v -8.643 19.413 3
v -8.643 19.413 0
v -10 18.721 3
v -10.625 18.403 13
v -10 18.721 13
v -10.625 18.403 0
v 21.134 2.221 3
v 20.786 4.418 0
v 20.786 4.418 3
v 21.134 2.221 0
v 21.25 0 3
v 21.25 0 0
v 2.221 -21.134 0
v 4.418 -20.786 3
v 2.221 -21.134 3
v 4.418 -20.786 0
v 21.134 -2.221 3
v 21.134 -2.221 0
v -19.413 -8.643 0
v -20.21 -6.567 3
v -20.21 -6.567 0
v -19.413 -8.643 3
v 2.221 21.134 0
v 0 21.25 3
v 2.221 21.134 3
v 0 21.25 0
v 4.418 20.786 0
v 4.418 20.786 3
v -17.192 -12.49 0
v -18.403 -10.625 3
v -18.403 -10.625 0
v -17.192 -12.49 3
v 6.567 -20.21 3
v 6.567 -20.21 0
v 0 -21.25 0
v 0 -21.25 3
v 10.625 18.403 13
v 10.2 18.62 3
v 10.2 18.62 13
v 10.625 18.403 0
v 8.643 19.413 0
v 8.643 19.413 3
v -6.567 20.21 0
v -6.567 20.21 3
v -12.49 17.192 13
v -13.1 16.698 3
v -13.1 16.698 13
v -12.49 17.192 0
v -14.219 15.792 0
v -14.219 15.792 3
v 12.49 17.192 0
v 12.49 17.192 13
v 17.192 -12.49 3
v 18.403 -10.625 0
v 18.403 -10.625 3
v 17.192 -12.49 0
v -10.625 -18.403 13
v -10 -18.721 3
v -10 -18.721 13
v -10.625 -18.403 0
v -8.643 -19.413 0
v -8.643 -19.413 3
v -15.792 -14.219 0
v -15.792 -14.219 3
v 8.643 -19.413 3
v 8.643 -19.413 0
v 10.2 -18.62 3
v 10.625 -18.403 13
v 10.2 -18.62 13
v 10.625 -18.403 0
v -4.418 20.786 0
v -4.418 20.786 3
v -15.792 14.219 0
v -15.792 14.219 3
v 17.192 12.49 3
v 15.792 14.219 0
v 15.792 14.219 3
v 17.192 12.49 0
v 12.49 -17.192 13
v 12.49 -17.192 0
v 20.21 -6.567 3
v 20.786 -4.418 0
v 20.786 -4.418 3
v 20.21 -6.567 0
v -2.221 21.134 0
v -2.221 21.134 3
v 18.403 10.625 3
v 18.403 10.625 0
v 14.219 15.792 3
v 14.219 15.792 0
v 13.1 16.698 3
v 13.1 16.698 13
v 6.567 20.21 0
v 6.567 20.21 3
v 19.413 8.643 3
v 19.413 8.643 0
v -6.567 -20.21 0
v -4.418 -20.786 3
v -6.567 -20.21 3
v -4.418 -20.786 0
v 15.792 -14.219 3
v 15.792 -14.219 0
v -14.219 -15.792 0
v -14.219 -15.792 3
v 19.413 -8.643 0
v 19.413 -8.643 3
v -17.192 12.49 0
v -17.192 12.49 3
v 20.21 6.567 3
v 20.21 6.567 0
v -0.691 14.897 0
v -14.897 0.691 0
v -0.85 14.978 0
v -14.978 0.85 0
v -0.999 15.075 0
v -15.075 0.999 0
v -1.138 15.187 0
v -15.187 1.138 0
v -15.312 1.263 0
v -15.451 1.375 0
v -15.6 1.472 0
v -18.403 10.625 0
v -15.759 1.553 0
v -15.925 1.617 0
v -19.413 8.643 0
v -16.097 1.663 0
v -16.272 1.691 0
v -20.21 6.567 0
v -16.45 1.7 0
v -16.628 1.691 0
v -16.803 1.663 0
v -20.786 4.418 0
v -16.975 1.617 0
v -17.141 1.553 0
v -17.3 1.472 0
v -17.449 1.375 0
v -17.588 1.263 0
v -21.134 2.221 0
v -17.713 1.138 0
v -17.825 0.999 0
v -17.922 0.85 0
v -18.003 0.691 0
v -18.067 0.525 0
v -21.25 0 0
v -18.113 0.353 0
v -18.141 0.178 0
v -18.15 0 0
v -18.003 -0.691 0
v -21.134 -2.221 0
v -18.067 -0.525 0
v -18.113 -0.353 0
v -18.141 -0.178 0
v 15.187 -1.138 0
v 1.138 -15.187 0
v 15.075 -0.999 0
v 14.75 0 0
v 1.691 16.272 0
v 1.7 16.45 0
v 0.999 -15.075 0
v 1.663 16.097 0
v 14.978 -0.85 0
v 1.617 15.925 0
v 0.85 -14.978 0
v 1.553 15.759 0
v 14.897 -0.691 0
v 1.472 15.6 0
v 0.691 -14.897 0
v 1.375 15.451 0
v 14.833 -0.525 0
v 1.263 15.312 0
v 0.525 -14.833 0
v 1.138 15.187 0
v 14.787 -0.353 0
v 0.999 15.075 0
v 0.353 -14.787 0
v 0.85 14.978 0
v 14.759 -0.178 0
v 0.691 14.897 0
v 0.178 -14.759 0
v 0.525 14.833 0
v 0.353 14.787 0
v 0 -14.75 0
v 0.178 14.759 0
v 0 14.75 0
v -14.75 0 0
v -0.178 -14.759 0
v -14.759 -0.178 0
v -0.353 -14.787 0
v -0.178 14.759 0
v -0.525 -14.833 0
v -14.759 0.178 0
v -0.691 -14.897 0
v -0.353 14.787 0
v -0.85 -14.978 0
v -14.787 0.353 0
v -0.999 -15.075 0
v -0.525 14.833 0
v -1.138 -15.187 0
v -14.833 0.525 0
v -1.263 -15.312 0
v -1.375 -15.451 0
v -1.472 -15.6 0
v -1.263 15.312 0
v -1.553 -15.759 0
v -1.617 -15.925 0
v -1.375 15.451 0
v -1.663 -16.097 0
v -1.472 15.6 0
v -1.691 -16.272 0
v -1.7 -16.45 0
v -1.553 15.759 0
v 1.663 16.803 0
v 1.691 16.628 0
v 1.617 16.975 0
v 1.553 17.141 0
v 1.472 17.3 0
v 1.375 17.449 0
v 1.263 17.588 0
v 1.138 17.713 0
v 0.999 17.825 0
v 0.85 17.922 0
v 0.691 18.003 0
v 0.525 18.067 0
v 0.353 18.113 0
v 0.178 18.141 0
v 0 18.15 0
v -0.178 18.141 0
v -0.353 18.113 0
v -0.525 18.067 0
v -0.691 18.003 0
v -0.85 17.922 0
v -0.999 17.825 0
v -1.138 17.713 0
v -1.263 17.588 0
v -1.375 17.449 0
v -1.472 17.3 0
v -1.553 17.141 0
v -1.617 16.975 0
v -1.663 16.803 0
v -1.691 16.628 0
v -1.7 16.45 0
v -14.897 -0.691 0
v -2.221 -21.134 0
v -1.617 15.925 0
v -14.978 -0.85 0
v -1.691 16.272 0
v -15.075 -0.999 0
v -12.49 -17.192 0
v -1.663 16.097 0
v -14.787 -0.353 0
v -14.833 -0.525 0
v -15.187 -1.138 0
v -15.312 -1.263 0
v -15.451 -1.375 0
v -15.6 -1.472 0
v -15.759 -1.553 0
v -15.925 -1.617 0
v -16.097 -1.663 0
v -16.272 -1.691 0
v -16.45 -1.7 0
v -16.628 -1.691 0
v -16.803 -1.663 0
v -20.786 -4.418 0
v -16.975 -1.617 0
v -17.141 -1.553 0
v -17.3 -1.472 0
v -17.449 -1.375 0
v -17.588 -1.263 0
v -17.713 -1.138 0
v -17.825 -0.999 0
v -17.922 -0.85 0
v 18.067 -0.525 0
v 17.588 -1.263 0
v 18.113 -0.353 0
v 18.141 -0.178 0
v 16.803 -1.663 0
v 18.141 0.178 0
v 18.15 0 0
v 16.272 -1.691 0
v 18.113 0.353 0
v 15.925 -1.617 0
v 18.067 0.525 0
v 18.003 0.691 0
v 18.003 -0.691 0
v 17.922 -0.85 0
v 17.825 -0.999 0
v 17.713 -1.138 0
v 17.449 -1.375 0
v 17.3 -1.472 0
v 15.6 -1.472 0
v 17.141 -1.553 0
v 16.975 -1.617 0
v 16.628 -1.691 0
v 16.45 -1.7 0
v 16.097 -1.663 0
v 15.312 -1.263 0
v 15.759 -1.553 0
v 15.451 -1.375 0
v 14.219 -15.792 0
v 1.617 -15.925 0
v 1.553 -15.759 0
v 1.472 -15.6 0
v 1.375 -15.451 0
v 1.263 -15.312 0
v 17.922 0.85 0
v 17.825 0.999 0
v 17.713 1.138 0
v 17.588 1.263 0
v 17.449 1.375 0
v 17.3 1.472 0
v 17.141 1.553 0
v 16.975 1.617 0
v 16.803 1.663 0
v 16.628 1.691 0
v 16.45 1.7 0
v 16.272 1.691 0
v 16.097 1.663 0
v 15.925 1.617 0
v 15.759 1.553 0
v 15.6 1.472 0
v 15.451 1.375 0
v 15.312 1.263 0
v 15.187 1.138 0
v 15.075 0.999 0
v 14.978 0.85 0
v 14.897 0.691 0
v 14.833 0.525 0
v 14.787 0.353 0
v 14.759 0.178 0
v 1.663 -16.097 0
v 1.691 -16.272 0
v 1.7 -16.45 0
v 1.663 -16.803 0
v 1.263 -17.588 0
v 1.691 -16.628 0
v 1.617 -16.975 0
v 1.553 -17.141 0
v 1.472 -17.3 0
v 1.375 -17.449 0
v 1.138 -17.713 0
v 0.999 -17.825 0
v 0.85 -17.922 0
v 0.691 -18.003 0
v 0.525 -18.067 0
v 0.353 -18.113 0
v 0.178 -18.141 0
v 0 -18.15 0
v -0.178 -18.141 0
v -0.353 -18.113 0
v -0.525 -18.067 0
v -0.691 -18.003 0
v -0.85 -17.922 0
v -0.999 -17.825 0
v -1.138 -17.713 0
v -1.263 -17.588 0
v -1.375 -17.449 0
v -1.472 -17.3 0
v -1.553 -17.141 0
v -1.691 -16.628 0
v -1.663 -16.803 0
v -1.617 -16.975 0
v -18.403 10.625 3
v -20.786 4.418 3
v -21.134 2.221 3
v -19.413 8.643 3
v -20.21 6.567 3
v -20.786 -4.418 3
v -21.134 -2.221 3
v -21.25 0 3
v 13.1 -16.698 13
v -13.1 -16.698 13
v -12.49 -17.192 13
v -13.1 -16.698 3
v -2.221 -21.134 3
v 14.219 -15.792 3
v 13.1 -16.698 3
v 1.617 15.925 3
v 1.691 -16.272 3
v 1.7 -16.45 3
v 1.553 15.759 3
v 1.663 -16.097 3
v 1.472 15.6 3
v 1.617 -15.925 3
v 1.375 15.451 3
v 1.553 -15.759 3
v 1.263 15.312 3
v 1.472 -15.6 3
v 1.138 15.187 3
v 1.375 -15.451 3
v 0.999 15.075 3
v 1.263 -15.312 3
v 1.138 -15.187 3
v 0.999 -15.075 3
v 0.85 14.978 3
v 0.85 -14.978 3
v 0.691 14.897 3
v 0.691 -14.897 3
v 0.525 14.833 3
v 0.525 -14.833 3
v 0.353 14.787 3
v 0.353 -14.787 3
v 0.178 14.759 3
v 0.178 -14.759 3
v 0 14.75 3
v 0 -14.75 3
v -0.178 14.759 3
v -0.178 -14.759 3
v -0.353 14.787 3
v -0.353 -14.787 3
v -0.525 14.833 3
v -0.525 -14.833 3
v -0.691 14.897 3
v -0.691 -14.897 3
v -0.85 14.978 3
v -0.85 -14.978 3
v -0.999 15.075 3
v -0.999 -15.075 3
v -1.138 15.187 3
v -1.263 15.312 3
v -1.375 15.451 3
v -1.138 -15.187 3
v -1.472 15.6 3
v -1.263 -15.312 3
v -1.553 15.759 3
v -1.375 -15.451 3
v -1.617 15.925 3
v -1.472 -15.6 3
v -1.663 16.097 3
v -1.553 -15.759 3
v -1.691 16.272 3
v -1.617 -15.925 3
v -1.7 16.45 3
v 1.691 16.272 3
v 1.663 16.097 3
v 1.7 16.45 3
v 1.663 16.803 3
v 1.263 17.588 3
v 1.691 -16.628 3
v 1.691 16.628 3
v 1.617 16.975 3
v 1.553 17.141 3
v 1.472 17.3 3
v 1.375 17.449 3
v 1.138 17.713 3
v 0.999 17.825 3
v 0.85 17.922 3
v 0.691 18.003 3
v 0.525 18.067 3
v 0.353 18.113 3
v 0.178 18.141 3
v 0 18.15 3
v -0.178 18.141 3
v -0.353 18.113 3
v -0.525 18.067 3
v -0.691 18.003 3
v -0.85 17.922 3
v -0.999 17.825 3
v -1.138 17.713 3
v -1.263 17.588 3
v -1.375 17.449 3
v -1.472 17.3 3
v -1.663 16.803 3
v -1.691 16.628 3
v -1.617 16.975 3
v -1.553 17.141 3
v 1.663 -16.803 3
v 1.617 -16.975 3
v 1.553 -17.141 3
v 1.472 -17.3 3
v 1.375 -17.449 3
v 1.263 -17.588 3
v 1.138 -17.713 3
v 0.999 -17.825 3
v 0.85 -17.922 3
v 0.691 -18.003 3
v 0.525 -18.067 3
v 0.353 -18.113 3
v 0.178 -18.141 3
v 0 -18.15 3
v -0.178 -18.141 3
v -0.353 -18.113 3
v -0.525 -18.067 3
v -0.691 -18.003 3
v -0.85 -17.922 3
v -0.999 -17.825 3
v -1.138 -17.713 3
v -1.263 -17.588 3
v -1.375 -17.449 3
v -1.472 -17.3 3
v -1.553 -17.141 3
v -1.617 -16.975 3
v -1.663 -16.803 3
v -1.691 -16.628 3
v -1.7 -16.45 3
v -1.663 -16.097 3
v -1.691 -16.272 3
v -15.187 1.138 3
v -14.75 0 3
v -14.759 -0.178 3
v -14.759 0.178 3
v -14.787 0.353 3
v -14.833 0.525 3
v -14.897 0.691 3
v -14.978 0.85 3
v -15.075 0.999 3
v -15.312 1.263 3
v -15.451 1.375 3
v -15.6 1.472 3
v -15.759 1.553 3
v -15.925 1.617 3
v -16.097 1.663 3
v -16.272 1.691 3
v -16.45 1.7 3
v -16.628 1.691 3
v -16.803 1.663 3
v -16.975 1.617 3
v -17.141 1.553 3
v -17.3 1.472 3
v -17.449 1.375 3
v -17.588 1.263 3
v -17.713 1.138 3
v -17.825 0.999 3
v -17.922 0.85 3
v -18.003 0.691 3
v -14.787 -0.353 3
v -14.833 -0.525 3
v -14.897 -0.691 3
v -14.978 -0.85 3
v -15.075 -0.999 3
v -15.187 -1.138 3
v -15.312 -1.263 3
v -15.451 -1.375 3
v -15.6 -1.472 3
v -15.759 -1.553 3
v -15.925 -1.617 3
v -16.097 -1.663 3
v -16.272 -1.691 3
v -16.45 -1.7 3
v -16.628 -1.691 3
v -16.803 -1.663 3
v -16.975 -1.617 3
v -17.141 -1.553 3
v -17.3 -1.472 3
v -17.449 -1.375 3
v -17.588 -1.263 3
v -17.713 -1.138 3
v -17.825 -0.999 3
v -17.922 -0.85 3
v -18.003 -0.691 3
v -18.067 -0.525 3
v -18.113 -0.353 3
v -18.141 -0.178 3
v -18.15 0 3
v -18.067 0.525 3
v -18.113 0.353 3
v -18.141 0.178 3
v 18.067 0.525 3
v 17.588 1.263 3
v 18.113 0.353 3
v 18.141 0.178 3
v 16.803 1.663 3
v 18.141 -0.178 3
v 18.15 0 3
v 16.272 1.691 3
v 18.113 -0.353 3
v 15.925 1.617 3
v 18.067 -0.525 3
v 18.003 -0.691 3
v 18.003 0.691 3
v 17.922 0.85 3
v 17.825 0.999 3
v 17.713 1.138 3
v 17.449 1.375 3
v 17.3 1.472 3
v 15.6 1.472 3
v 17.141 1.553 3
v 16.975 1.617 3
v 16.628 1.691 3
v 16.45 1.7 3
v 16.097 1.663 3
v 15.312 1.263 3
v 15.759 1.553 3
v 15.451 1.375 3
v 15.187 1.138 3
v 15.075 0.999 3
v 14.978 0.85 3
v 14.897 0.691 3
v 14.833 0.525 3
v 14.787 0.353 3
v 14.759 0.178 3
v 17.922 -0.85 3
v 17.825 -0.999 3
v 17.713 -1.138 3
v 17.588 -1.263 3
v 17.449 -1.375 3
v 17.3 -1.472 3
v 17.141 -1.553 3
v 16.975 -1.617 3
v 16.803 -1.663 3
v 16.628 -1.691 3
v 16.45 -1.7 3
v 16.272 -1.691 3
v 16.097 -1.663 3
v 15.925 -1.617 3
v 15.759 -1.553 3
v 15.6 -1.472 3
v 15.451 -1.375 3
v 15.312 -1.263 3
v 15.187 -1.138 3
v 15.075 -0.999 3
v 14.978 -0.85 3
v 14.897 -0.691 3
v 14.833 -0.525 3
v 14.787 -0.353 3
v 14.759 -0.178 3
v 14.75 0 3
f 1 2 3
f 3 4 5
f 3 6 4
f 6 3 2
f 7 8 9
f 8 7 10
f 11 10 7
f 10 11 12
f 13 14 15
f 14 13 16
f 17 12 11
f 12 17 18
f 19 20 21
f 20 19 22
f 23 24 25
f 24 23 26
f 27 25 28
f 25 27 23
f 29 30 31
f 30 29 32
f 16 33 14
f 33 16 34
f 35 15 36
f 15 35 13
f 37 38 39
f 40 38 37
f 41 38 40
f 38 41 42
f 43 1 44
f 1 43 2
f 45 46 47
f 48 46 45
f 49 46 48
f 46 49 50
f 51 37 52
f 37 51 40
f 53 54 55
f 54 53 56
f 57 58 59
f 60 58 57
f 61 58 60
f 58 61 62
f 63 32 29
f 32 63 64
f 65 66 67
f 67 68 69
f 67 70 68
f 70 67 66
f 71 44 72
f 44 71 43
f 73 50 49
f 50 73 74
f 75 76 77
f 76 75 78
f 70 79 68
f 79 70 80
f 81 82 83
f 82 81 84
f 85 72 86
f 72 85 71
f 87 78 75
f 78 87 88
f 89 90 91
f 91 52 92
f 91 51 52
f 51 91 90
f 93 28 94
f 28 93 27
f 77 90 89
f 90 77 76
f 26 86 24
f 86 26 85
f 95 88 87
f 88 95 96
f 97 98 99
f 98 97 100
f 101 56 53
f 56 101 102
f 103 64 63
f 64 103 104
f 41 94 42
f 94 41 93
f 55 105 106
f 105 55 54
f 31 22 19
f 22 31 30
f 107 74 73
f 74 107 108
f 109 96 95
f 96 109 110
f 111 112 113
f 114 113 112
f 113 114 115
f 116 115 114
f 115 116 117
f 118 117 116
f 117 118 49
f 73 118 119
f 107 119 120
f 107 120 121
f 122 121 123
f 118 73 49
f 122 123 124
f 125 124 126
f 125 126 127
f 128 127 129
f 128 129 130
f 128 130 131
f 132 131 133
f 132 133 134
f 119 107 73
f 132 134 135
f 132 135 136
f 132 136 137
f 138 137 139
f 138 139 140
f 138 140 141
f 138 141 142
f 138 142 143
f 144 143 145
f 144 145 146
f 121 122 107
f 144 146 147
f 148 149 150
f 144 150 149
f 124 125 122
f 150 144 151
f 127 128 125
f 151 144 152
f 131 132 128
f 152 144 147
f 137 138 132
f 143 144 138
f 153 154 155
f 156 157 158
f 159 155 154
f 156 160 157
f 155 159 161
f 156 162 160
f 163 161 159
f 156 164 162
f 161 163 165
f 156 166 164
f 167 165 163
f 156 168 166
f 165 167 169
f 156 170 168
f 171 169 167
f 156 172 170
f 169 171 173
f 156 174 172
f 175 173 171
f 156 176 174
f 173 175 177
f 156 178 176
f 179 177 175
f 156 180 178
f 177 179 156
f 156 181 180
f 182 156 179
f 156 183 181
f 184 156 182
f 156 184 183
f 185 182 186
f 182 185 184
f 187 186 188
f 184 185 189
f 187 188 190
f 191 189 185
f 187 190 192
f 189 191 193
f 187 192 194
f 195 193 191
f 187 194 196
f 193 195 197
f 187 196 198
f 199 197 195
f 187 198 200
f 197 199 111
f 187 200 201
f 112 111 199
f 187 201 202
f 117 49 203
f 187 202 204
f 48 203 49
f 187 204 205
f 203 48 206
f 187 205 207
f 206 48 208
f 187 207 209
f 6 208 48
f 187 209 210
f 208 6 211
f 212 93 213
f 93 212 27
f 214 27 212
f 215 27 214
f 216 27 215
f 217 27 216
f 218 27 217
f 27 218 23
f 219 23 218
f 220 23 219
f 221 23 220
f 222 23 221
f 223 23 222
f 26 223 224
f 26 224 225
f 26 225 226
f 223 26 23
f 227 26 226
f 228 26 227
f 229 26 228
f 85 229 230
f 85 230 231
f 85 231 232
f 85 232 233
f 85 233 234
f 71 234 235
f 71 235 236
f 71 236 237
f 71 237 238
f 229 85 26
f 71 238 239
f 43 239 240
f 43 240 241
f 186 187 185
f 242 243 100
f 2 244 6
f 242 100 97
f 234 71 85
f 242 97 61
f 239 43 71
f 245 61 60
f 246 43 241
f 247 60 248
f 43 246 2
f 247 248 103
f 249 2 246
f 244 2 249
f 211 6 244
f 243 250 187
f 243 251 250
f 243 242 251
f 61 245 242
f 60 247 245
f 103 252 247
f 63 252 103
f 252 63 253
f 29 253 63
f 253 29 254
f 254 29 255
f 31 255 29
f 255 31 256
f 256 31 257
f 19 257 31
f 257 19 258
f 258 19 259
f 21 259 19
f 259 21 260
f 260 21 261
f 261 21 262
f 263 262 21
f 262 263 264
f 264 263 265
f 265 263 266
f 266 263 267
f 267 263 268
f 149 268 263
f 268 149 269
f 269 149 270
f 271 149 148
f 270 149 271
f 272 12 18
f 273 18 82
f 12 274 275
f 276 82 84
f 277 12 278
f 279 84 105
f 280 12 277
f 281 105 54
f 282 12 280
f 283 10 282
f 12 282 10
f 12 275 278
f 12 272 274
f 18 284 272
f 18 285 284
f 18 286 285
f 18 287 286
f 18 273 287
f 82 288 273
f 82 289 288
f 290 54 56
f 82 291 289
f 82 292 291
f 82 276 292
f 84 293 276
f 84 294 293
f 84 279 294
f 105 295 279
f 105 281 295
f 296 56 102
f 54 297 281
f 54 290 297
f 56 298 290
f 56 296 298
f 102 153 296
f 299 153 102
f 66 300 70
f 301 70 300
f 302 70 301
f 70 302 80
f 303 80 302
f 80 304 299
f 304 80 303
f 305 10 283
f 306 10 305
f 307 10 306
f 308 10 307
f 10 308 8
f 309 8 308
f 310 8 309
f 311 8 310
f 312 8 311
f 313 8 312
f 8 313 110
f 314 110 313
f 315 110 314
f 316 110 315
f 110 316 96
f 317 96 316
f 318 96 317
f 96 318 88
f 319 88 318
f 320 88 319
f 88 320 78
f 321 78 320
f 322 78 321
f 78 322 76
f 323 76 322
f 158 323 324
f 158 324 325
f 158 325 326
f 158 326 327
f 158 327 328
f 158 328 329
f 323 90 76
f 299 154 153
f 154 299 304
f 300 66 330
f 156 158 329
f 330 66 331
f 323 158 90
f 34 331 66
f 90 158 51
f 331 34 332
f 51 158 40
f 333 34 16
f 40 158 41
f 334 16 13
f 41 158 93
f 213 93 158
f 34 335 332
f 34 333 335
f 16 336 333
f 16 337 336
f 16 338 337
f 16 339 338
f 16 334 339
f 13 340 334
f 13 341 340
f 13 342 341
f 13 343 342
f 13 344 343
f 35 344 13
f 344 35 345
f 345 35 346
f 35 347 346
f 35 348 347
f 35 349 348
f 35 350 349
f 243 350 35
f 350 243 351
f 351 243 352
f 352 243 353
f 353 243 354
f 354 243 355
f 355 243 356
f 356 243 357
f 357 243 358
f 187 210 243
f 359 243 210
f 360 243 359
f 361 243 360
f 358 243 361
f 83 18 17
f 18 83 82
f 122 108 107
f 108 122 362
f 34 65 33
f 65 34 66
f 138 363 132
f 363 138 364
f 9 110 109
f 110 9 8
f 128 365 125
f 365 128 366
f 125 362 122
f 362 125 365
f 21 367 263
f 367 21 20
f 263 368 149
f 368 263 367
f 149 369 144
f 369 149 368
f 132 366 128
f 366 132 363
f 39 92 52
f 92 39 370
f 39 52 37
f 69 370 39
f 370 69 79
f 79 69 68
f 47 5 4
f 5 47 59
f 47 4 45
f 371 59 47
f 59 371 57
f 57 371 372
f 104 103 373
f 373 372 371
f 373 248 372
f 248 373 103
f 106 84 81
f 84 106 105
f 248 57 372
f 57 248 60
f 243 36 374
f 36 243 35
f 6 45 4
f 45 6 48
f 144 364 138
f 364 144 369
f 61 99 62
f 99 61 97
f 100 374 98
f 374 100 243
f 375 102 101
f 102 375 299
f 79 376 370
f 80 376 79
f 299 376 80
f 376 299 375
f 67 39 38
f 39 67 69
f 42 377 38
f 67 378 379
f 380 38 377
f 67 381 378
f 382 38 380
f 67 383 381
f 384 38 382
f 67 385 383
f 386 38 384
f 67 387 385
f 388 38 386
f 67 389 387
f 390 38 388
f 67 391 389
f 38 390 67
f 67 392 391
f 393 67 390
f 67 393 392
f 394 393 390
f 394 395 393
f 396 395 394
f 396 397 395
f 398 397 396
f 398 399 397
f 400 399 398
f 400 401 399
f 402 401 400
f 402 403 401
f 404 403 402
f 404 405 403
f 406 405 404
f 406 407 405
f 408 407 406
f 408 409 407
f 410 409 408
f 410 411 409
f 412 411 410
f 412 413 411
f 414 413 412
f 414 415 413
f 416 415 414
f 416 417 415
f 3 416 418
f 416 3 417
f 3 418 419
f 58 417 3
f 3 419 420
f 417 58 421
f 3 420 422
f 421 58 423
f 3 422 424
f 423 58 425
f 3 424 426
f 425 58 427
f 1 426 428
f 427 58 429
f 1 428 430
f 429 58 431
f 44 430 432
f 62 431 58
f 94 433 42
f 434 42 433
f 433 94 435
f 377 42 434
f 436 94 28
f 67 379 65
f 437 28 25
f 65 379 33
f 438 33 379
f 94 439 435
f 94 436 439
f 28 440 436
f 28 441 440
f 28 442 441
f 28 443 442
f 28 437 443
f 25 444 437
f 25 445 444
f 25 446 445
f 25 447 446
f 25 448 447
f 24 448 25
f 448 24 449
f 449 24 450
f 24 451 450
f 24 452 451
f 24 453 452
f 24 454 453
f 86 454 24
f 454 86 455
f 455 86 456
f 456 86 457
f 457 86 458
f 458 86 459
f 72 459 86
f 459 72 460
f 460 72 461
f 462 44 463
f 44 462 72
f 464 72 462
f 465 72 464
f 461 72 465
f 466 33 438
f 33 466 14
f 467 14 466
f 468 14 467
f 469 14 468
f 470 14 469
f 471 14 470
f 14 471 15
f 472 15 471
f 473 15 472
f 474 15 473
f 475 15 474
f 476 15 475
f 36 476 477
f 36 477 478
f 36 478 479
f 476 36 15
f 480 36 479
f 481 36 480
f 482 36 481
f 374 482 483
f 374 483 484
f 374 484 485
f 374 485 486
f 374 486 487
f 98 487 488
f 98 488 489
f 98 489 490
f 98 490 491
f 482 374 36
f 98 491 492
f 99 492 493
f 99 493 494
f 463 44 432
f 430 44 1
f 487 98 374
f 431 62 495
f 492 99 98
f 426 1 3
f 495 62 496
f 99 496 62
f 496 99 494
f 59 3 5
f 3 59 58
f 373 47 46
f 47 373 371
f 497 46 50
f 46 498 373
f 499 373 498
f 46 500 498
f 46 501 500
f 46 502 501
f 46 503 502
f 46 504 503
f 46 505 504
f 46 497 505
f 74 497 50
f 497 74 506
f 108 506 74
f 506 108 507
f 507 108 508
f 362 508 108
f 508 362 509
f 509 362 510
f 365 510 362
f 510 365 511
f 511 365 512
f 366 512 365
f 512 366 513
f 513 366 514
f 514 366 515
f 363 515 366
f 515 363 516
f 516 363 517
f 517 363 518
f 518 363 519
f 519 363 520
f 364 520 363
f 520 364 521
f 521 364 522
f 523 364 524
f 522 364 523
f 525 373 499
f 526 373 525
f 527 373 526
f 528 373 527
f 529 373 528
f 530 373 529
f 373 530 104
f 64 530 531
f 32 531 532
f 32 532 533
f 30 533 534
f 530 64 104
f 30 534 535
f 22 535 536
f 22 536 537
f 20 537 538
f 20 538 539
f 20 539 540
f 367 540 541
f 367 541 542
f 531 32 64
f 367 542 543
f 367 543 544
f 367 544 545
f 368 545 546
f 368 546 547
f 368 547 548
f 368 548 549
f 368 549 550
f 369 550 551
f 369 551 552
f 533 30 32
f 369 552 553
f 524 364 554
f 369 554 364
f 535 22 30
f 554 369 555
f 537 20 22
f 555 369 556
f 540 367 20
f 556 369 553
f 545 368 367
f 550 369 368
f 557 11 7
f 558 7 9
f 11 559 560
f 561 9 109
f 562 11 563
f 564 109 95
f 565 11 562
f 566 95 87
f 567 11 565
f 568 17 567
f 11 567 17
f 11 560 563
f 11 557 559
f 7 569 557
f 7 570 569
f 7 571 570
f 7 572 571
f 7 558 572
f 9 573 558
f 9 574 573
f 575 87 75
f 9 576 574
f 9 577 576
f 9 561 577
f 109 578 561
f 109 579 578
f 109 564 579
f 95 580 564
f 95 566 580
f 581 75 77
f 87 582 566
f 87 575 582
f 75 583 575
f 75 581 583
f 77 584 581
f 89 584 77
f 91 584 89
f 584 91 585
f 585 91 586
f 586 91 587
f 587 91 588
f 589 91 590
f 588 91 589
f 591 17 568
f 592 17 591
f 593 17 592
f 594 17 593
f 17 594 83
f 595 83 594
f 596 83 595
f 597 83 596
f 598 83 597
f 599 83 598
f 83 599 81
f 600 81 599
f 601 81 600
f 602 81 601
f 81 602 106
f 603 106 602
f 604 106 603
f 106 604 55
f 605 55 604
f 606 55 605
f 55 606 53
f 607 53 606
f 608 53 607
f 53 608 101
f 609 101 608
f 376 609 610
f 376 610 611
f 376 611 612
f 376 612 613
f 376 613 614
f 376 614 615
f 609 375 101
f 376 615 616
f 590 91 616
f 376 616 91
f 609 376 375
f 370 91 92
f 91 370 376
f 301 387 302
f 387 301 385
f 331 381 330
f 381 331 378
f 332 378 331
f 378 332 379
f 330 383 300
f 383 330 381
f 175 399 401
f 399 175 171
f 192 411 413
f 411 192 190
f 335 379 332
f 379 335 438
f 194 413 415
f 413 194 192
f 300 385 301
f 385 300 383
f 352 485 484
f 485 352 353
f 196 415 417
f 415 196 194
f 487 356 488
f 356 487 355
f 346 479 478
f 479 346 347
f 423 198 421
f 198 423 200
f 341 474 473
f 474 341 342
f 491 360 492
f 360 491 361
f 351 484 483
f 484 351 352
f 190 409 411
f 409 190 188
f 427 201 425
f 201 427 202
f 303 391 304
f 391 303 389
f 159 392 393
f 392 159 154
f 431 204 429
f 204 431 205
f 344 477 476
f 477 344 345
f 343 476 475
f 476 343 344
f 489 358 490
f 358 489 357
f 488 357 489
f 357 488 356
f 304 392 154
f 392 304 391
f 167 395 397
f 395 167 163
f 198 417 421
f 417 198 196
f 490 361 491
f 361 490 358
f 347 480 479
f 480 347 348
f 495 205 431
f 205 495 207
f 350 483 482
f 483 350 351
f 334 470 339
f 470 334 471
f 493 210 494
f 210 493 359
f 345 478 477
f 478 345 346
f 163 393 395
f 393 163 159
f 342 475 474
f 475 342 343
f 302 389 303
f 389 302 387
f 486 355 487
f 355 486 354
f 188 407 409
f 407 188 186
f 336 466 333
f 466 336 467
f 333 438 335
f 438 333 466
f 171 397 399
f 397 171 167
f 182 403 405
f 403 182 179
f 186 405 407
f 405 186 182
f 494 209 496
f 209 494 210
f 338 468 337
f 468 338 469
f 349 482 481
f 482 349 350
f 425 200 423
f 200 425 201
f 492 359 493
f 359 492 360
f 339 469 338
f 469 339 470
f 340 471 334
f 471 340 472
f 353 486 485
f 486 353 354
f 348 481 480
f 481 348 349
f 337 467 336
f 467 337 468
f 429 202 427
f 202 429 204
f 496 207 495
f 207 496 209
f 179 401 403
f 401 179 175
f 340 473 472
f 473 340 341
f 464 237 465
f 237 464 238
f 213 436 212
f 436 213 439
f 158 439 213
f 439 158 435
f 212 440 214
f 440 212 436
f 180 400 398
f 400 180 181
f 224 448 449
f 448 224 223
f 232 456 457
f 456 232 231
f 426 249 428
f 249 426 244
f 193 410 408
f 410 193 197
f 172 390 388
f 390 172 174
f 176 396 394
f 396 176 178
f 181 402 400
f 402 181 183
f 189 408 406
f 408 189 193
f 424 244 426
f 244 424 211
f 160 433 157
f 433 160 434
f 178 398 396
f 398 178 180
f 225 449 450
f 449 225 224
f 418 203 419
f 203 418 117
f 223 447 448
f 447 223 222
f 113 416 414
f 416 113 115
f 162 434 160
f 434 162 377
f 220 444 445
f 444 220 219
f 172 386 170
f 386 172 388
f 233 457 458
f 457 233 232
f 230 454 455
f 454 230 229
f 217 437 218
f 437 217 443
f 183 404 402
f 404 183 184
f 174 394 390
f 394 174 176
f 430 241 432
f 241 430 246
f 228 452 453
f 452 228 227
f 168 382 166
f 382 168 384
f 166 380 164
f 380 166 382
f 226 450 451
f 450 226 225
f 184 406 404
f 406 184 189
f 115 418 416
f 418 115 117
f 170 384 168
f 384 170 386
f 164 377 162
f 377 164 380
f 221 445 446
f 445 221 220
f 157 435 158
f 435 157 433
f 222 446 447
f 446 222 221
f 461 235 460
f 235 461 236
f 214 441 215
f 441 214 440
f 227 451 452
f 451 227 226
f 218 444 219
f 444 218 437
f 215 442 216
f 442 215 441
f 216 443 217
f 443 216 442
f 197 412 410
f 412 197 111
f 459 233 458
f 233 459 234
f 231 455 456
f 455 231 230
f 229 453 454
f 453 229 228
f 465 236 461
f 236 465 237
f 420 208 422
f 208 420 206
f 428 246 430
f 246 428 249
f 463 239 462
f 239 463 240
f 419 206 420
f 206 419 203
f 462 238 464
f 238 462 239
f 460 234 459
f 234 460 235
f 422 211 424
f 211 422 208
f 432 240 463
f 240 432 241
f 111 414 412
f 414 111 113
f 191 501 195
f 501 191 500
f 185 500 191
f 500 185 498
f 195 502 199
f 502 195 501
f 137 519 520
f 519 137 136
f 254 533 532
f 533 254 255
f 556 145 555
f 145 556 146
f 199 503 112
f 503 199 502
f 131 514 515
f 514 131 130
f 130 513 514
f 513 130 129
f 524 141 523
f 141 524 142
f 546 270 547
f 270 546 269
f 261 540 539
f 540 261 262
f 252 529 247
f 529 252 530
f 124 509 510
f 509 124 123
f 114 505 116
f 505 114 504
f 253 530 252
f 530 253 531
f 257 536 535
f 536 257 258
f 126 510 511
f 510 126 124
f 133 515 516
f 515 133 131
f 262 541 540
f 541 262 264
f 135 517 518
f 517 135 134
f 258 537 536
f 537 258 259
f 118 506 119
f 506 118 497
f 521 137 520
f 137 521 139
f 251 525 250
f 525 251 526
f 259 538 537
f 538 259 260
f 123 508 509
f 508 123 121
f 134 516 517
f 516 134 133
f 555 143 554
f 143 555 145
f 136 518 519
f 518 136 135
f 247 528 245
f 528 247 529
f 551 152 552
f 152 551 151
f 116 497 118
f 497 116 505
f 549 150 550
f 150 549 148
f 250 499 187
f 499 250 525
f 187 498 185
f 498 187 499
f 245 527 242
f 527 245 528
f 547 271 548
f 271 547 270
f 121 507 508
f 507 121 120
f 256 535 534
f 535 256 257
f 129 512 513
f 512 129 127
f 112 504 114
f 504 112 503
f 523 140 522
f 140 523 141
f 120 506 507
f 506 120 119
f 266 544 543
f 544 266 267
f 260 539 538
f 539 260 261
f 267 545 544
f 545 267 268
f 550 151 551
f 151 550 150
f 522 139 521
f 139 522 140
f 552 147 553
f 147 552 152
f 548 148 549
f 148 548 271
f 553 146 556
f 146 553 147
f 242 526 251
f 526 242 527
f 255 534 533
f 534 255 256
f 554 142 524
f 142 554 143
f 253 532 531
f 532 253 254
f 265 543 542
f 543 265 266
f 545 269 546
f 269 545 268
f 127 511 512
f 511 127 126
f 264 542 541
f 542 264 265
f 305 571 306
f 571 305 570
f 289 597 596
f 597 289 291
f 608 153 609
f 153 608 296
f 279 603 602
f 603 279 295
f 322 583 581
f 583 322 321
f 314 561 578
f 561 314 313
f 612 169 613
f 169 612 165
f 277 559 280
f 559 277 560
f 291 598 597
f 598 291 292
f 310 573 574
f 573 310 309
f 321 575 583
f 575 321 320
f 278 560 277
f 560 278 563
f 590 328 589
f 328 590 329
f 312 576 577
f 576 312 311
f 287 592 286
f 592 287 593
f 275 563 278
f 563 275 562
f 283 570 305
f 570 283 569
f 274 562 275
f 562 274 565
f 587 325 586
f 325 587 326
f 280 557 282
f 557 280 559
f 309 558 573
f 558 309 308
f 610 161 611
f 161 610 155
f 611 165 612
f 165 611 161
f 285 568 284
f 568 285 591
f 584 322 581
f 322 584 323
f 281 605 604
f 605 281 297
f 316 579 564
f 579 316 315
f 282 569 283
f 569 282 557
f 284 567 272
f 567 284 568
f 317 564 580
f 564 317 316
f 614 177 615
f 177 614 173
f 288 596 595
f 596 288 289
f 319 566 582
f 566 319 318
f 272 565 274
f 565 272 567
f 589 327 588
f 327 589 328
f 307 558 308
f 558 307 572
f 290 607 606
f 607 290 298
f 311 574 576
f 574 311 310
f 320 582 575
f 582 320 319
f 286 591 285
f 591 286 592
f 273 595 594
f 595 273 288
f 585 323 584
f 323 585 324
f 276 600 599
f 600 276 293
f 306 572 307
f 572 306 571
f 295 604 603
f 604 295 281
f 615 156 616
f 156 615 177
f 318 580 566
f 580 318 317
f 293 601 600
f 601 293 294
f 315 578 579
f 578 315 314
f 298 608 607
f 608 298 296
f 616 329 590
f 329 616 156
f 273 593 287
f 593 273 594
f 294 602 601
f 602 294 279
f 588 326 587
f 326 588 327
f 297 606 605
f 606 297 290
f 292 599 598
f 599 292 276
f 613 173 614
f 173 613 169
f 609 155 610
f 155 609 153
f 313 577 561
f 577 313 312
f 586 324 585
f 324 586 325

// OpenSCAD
tube_thickness=20.2;
support_wall_thickness=3;
plate_diameter=42.5;
difference(){
cylinder(r=(plate_diameter/2),h=13,$fn=60);
translate([-10,-plate_diameter/2,3]) cube([tube_thickness,plate_diameter,20],centre=true);
translate([-(plate_diameter/2),-plate_diameter/2,3]) cube([((plate_diameter/2)-(tube_thickness/2+support_wall_thickness)),plate_diameter,20]);
translate([((plate_diameter/2)-((plate_diameter/2)-(tube_thickness/2+support_wall_thickness))),-plate_diameter/2,3]) cube([((plate_diameter/2)-(tube_thickness/2+support_wall_thickness)),plate_diameter,20]);
//mounting holes //
translate([0,-(42.5/2)+4.8,0]) cylinder(r=1.7,h=3,$fn=60);
translate([0,(42.5/2)-4.8,0]) cylinder(r=1.7,h=3,$fn=60);
translate([-(42.5/2)+4.8,0,0]) cylinder(r=1.7,h=3,$fn=60);
translate([(42.5/2)-4.8,0,0]) cylinder(r=1.7,h=3,$fn=60);
}

